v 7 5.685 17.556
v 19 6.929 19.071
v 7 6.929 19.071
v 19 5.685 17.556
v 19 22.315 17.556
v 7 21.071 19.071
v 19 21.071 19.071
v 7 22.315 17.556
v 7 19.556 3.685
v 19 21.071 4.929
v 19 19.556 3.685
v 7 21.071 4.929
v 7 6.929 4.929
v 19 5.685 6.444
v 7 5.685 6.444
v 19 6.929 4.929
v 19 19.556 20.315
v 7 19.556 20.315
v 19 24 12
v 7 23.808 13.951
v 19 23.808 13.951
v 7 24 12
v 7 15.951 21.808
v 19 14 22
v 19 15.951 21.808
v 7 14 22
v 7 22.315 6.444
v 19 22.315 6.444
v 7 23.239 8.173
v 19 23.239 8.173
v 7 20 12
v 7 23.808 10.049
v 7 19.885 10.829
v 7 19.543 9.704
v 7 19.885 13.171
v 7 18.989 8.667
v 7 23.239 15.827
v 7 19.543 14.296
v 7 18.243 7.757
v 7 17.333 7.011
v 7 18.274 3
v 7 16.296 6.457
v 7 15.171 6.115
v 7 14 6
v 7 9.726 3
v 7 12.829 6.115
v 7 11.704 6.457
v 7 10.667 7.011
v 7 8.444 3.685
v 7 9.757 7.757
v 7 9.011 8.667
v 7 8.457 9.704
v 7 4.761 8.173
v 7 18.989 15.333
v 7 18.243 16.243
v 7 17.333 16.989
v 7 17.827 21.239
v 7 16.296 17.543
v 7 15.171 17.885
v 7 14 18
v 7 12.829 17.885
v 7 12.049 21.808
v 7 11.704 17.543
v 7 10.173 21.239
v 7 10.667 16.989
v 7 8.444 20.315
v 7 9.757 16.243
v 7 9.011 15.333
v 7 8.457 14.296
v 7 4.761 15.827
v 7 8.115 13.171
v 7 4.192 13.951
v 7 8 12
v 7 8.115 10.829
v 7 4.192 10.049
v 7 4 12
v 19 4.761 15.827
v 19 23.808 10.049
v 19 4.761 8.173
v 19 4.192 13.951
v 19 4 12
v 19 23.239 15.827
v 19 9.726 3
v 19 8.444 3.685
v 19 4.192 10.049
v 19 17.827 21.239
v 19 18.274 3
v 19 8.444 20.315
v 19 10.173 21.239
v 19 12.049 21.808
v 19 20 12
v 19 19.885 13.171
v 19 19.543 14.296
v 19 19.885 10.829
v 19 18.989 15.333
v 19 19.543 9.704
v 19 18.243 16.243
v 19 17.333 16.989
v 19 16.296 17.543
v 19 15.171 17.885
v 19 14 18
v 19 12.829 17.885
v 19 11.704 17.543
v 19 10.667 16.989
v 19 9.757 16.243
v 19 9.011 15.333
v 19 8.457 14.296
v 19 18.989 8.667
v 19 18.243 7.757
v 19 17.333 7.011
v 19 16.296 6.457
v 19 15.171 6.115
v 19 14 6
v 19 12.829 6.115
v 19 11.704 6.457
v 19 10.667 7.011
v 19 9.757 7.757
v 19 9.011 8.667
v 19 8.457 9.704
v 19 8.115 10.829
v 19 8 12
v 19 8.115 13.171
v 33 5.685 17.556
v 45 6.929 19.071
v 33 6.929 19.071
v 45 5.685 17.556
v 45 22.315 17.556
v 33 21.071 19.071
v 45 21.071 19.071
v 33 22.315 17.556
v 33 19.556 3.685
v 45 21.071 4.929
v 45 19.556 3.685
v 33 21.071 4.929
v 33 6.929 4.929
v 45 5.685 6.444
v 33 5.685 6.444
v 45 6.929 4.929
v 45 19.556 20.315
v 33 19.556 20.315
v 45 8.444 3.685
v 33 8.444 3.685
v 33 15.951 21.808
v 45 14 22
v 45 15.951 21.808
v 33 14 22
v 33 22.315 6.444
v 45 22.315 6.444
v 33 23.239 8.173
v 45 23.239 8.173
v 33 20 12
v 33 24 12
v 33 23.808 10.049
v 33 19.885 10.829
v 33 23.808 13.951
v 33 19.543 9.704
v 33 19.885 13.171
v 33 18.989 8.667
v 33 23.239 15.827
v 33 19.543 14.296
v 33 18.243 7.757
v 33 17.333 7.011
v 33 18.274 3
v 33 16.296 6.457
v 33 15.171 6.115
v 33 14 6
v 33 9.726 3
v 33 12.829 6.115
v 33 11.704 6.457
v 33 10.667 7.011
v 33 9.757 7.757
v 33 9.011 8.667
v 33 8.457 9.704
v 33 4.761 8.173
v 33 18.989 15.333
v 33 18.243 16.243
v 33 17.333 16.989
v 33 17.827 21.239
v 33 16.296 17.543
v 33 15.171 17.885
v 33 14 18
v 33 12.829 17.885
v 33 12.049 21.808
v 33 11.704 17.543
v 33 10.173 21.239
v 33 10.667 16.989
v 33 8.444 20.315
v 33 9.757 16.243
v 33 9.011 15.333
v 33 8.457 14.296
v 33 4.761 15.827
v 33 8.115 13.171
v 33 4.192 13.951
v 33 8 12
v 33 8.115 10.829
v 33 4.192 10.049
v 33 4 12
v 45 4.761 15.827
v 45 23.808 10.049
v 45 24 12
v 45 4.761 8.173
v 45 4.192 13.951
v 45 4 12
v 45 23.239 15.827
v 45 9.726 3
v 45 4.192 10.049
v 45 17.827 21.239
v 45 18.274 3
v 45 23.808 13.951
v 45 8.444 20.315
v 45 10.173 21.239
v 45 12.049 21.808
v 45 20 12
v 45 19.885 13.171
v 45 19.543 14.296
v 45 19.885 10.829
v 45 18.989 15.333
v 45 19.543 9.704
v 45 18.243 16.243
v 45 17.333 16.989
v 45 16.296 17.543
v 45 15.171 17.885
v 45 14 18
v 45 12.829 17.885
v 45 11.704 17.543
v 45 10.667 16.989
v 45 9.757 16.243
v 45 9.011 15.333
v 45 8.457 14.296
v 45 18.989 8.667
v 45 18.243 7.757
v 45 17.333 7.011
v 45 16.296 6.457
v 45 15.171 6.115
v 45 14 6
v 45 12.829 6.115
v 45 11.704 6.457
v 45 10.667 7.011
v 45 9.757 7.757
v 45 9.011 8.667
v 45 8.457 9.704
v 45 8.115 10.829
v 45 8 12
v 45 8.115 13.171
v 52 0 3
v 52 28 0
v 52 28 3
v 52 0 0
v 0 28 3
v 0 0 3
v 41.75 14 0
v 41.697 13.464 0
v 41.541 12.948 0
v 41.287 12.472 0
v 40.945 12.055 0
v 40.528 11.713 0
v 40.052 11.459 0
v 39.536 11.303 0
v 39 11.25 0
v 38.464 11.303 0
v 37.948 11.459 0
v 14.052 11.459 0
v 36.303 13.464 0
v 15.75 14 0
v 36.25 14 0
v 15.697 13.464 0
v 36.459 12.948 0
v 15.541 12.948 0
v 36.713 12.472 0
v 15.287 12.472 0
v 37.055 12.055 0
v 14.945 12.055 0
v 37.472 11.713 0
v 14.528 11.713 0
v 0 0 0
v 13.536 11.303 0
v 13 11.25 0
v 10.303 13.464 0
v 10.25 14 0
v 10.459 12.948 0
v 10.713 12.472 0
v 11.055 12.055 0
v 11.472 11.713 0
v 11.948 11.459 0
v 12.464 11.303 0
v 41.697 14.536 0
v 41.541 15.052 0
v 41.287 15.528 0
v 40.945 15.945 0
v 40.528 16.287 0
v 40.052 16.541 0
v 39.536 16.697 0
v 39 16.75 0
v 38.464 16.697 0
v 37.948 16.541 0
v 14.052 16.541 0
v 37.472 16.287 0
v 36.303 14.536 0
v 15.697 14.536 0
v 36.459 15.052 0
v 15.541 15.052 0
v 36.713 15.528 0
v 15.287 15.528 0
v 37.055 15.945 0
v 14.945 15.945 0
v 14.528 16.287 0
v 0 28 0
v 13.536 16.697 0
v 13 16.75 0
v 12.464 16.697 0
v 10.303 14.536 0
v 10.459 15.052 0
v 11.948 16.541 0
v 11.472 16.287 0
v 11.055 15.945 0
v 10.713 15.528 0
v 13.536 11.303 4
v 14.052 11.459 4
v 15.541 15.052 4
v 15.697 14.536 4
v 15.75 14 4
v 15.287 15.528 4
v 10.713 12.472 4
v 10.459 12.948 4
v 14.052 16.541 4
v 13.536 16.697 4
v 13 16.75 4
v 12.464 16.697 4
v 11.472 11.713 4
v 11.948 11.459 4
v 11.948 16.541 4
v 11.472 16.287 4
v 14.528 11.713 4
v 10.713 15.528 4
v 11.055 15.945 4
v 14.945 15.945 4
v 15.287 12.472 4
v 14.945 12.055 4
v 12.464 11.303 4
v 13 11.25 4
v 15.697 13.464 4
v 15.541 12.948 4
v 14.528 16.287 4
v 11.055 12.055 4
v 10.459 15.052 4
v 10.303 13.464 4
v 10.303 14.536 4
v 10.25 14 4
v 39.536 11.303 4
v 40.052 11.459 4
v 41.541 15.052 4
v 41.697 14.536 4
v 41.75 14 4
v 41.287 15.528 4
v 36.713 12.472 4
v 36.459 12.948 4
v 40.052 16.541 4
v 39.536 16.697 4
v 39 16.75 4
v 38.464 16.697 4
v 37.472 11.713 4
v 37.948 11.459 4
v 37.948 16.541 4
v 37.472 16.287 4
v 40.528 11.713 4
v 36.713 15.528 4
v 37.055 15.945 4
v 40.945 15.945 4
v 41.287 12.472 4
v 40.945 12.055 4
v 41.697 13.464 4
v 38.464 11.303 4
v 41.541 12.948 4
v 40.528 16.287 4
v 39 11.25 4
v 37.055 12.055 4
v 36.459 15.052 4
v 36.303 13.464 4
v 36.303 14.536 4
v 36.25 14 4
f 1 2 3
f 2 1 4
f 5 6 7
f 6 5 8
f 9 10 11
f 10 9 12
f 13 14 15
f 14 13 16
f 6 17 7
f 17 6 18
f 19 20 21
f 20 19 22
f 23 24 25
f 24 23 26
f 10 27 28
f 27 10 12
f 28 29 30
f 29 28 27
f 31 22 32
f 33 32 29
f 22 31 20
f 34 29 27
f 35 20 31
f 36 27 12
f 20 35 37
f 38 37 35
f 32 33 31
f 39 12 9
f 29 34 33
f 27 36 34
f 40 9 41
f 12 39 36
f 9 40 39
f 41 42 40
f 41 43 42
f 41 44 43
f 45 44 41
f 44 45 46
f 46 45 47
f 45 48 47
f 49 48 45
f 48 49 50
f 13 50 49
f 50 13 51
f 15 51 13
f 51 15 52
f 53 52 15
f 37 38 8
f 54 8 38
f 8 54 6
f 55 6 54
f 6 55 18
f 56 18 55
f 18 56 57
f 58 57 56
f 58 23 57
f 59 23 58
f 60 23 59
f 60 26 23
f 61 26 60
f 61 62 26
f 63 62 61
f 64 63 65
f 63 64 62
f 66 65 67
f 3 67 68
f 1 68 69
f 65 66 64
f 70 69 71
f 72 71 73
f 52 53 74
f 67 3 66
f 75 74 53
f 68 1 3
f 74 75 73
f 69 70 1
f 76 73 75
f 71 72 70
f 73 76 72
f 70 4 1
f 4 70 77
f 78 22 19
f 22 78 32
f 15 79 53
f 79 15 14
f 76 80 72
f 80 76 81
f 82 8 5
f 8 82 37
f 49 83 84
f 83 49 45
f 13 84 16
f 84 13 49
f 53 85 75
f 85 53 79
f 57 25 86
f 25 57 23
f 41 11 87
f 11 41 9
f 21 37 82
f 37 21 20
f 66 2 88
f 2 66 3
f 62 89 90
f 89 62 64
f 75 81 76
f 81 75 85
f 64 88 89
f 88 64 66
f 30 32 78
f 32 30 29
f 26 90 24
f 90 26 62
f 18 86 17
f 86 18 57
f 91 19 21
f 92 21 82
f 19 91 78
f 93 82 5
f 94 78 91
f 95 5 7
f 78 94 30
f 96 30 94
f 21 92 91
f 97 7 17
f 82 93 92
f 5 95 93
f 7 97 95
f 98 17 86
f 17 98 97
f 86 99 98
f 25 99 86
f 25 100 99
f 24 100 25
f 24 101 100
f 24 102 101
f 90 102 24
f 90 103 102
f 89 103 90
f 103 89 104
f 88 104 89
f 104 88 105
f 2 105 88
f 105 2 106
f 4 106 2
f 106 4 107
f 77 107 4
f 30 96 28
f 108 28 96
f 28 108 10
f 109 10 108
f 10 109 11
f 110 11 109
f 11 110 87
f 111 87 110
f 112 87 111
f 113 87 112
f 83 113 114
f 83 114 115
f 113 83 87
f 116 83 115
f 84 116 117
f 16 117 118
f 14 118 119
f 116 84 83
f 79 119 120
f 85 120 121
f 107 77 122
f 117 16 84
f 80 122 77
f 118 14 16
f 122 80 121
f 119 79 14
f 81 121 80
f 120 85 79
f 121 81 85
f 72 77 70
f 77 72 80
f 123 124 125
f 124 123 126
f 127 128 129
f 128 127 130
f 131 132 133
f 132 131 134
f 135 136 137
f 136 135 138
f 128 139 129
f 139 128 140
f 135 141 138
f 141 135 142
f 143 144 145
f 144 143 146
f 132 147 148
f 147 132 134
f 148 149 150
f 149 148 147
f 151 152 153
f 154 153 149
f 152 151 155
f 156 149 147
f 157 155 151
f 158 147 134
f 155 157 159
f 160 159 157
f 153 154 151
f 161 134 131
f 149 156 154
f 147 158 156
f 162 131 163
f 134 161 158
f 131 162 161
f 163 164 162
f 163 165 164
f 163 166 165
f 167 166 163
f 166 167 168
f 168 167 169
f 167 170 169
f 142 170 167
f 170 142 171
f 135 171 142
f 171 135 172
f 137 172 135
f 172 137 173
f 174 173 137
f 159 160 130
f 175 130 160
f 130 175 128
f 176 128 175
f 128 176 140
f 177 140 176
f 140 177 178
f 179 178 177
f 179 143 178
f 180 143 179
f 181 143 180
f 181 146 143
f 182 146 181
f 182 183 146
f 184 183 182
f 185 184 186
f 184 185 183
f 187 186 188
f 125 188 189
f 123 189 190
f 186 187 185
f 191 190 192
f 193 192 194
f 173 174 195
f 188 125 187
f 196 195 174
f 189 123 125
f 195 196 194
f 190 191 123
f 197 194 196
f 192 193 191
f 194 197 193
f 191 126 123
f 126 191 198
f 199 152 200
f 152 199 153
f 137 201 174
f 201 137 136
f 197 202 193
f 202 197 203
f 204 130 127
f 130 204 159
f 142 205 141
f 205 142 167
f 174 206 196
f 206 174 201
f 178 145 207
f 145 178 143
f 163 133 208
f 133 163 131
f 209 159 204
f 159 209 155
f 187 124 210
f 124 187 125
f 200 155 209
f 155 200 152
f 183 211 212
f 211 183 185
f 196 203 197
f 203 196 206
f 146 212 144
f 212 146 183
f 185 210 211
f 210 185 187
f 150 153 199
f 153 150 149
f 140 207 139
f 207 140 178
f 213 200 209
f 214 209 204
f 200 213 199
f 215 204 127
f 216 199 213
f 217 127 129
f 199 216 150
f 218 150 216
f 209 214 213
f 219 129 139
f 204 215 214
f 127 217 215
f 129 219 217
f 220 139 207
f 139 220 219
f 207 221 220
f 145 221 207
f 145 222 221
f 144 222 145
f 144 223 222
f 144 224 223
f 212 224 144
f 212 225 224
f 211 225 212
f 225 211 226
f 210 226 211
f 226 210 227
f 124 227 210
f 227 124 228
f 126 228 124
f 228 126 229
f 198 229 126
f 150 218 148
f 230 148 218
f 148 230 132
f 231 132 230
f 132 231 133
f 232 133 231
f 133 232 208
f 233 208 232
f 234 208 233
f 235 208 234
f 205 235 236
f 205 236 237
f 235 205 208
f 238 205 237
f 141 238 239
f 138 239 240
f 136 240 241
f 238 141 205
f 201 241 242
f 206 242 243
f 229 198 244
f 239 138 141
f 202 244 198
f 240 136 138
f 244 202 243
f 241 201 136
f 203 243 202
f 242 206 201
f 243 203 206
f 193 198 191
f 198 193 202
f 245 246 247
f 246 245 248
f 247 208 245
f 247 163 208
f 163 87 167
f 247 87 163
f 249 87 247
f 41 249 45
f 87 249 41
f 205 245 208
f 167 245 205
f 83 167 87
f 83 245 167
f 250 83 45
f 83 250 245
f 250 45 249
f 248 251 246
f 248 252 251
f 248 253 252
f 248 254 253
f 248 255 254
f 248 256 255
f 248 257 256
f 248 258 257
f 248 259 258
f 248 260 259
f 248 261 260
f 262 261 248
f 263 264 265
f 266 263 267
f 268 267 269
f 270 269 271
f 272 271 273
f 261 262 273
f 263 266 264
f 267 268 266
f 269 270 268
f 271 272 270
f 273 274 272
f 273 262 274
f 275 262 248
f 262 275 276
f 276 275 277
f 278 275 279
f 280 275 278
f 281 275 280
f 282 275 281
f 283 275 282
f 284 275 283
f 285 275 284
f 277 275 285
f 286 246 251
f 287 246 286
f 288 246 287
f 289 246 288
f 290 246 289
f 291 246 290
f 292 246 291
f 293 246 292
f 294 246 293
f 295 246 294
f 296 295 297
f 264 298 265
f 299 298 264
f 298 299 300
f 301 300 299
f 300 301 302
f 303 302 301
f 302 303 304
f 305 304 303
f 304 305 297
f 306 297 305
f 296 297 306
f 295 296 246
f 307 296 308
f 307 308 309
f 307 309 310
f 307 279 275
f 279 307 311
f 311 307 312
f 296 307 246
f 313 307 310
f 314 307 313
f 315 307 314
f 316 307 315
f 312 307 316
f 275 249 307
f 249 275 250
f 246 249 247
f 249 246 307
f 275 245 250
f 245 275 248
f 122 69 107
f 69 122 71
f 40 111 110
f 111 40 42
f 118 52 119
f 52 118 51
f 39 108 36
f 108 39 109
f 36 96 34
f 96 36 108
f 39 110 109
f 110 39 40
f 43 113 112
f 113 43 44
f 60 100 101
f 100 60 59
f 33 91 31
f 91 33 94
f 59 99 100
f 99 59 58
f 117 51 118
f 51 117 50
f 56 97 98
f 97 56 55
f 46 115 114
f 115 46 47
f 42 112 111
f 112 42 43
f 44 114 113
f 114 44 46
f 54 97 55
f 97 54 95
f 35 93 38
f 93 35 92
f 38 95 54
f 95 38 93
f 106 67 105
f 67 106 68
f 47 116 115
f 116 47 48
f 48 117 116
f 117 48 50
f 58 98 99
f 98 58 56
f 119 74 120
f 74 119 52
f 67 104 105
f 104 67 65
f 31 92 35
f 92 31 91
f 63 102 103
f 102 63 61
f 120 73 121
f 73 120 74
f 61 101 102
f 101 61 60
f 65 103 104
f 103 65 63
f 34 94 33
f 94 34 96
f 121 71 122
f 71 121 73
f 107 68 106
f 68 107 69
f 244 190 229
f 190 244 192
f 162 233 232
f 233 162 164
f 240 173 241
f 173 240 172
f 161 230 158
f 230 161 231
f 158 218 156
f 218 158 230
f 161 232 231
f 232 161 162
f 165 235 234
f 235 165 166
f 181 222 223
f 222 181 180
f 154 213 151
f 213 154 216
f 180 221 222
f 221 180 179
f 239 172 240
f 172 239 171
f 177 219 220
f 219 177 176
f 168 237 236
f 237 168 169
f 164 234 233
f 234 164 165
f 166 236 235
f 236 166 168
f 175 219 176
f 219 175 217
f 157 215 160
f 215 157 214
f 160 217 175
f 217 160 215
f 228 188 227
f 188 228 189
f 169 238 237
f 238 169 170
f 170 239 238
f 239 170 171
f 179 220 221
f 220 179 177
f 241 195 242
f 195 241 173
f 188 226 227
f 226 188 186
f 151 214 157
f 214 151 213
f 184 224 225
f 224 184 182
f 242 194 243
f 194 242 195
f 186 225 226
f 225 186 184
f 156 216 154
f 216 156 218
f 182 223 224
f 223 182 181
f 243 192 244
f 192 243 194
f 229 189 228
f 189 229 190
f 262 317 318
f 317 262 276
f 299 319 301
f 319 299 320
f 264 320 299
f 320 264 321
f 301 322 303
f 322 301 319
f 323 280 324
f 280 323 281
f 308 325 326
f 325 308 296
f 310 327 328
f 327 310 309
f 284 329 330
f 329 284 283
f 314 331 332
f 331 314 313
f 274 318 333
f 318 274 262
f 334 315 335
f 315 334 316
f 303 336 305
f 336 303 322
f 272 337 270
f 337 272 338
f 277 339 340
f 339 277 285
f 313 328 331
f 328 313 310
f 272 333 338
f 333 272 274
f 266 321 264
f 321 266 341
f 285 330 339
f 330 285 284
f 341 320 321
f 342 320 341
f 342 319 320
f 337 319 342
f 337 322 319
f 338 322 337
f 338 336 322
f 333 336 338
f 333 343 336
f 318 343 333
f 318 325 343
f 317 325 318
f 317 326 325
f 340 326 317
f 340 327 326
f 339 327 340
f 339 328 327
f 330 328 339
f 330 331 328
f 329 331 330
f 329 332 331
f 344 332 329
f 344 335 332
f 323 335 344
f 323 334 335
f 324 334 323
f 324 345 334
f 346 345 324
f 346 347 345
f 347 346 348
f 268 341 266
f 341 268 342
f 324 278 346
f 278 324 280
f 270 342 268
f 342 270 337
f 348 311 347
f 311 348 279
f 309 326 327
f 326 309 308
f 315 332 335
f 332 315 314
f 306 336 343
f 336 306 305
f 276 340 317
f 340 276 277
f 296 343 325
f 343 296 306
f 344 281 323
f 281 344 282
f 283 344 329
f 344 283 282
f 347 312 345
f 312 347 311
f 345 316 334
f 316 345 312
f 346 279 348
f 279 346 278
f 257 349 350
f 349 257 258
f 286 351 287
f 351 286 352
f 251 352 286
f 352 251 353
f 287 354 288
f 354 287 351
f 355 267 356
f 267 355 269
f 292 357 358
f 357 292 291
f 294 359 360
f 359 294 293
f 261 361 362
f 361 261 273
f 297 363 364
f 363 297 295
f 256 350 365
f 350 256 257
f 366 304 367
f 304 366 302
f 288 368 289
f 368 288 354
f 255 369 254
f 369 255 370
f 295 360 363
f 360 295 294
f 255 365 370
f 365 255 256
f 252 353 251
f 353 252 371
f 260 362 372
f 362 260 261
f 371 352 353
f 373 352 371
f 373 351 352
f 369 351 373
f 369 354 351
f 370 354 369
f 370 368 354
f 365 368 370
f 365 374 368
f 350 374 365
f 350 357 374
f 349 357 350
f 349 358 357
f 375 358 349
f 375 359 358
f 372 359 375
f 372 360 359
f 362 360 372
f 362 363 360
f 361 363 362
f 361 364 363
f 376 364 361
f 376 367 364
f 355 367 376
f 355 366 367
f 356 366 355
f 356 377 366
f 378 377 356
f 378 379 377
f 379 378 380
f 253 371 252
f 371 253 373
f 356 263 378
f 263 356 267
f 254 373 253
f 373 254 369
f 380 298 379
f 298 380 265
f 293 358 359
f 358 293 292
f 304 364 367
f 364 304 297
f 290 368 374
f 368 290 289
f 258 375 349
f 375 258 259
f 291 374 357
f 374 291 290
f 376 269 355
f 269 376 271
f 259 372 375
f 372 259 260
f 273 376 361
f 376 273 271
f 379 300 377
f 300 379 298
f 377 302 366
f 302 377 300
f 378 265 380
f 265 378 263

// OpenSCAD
$fn = 32;

// ----------------------------------------------------------------------
// Cable clip: cable 12 mm, clamp 20 mm, base 52 mm
// ----------------------------------------------------------------------

// --- parameters (mm) ---
foot_w = 52;              // base length, X
foot_d = 28;              // base width, Y
foot_t = 3;               // base thickness
hose_seat_d = 20;         // clamp outside diameter
ring_t = 4;               // clamp wall
cable_d = 12;             // cable opening
ring_w = 12;              // clamp width along the cable
screw_d = 5.5;            // screw clearance
sink = 1;                 // overlap of the clamp into the base
pitch = 26;               // distance between the two clamps

module base() {
  cube([foot_w, foot_d, foot_t]);
}

module clamps() {
  for (sx = [-1, 1])
    translate([foot_w / 2 + sx * pitch / 2, foot_d / 2, foot_t + hose_seat_d / 2 - sink]) rotate([0, 90, 0])
      cylinder(h = ring_w, d = hose_seat_d, center = true);
}

difference() {
  union() {
    base();
    clamps();
  }
  for (sx = [-1, 1])
    translate([foot_w / 2 + sx * pitch / 2, foot_d / 2, foot_t + hose_seat_d / 2 - sink]) rotate([0, 90, 0]) translate([0, 0, -ring_w / 2 - 1]) cylinder(h = ring_w + 2, d = cable_d);
  translate([13, foot_d / 2, -1]) cylinder(h = foot_t + 2, d = screw_d);
  translate([39, foot_d / 2, -1]) cylinder(h = foot_t + 2, d = screw_d);
}
